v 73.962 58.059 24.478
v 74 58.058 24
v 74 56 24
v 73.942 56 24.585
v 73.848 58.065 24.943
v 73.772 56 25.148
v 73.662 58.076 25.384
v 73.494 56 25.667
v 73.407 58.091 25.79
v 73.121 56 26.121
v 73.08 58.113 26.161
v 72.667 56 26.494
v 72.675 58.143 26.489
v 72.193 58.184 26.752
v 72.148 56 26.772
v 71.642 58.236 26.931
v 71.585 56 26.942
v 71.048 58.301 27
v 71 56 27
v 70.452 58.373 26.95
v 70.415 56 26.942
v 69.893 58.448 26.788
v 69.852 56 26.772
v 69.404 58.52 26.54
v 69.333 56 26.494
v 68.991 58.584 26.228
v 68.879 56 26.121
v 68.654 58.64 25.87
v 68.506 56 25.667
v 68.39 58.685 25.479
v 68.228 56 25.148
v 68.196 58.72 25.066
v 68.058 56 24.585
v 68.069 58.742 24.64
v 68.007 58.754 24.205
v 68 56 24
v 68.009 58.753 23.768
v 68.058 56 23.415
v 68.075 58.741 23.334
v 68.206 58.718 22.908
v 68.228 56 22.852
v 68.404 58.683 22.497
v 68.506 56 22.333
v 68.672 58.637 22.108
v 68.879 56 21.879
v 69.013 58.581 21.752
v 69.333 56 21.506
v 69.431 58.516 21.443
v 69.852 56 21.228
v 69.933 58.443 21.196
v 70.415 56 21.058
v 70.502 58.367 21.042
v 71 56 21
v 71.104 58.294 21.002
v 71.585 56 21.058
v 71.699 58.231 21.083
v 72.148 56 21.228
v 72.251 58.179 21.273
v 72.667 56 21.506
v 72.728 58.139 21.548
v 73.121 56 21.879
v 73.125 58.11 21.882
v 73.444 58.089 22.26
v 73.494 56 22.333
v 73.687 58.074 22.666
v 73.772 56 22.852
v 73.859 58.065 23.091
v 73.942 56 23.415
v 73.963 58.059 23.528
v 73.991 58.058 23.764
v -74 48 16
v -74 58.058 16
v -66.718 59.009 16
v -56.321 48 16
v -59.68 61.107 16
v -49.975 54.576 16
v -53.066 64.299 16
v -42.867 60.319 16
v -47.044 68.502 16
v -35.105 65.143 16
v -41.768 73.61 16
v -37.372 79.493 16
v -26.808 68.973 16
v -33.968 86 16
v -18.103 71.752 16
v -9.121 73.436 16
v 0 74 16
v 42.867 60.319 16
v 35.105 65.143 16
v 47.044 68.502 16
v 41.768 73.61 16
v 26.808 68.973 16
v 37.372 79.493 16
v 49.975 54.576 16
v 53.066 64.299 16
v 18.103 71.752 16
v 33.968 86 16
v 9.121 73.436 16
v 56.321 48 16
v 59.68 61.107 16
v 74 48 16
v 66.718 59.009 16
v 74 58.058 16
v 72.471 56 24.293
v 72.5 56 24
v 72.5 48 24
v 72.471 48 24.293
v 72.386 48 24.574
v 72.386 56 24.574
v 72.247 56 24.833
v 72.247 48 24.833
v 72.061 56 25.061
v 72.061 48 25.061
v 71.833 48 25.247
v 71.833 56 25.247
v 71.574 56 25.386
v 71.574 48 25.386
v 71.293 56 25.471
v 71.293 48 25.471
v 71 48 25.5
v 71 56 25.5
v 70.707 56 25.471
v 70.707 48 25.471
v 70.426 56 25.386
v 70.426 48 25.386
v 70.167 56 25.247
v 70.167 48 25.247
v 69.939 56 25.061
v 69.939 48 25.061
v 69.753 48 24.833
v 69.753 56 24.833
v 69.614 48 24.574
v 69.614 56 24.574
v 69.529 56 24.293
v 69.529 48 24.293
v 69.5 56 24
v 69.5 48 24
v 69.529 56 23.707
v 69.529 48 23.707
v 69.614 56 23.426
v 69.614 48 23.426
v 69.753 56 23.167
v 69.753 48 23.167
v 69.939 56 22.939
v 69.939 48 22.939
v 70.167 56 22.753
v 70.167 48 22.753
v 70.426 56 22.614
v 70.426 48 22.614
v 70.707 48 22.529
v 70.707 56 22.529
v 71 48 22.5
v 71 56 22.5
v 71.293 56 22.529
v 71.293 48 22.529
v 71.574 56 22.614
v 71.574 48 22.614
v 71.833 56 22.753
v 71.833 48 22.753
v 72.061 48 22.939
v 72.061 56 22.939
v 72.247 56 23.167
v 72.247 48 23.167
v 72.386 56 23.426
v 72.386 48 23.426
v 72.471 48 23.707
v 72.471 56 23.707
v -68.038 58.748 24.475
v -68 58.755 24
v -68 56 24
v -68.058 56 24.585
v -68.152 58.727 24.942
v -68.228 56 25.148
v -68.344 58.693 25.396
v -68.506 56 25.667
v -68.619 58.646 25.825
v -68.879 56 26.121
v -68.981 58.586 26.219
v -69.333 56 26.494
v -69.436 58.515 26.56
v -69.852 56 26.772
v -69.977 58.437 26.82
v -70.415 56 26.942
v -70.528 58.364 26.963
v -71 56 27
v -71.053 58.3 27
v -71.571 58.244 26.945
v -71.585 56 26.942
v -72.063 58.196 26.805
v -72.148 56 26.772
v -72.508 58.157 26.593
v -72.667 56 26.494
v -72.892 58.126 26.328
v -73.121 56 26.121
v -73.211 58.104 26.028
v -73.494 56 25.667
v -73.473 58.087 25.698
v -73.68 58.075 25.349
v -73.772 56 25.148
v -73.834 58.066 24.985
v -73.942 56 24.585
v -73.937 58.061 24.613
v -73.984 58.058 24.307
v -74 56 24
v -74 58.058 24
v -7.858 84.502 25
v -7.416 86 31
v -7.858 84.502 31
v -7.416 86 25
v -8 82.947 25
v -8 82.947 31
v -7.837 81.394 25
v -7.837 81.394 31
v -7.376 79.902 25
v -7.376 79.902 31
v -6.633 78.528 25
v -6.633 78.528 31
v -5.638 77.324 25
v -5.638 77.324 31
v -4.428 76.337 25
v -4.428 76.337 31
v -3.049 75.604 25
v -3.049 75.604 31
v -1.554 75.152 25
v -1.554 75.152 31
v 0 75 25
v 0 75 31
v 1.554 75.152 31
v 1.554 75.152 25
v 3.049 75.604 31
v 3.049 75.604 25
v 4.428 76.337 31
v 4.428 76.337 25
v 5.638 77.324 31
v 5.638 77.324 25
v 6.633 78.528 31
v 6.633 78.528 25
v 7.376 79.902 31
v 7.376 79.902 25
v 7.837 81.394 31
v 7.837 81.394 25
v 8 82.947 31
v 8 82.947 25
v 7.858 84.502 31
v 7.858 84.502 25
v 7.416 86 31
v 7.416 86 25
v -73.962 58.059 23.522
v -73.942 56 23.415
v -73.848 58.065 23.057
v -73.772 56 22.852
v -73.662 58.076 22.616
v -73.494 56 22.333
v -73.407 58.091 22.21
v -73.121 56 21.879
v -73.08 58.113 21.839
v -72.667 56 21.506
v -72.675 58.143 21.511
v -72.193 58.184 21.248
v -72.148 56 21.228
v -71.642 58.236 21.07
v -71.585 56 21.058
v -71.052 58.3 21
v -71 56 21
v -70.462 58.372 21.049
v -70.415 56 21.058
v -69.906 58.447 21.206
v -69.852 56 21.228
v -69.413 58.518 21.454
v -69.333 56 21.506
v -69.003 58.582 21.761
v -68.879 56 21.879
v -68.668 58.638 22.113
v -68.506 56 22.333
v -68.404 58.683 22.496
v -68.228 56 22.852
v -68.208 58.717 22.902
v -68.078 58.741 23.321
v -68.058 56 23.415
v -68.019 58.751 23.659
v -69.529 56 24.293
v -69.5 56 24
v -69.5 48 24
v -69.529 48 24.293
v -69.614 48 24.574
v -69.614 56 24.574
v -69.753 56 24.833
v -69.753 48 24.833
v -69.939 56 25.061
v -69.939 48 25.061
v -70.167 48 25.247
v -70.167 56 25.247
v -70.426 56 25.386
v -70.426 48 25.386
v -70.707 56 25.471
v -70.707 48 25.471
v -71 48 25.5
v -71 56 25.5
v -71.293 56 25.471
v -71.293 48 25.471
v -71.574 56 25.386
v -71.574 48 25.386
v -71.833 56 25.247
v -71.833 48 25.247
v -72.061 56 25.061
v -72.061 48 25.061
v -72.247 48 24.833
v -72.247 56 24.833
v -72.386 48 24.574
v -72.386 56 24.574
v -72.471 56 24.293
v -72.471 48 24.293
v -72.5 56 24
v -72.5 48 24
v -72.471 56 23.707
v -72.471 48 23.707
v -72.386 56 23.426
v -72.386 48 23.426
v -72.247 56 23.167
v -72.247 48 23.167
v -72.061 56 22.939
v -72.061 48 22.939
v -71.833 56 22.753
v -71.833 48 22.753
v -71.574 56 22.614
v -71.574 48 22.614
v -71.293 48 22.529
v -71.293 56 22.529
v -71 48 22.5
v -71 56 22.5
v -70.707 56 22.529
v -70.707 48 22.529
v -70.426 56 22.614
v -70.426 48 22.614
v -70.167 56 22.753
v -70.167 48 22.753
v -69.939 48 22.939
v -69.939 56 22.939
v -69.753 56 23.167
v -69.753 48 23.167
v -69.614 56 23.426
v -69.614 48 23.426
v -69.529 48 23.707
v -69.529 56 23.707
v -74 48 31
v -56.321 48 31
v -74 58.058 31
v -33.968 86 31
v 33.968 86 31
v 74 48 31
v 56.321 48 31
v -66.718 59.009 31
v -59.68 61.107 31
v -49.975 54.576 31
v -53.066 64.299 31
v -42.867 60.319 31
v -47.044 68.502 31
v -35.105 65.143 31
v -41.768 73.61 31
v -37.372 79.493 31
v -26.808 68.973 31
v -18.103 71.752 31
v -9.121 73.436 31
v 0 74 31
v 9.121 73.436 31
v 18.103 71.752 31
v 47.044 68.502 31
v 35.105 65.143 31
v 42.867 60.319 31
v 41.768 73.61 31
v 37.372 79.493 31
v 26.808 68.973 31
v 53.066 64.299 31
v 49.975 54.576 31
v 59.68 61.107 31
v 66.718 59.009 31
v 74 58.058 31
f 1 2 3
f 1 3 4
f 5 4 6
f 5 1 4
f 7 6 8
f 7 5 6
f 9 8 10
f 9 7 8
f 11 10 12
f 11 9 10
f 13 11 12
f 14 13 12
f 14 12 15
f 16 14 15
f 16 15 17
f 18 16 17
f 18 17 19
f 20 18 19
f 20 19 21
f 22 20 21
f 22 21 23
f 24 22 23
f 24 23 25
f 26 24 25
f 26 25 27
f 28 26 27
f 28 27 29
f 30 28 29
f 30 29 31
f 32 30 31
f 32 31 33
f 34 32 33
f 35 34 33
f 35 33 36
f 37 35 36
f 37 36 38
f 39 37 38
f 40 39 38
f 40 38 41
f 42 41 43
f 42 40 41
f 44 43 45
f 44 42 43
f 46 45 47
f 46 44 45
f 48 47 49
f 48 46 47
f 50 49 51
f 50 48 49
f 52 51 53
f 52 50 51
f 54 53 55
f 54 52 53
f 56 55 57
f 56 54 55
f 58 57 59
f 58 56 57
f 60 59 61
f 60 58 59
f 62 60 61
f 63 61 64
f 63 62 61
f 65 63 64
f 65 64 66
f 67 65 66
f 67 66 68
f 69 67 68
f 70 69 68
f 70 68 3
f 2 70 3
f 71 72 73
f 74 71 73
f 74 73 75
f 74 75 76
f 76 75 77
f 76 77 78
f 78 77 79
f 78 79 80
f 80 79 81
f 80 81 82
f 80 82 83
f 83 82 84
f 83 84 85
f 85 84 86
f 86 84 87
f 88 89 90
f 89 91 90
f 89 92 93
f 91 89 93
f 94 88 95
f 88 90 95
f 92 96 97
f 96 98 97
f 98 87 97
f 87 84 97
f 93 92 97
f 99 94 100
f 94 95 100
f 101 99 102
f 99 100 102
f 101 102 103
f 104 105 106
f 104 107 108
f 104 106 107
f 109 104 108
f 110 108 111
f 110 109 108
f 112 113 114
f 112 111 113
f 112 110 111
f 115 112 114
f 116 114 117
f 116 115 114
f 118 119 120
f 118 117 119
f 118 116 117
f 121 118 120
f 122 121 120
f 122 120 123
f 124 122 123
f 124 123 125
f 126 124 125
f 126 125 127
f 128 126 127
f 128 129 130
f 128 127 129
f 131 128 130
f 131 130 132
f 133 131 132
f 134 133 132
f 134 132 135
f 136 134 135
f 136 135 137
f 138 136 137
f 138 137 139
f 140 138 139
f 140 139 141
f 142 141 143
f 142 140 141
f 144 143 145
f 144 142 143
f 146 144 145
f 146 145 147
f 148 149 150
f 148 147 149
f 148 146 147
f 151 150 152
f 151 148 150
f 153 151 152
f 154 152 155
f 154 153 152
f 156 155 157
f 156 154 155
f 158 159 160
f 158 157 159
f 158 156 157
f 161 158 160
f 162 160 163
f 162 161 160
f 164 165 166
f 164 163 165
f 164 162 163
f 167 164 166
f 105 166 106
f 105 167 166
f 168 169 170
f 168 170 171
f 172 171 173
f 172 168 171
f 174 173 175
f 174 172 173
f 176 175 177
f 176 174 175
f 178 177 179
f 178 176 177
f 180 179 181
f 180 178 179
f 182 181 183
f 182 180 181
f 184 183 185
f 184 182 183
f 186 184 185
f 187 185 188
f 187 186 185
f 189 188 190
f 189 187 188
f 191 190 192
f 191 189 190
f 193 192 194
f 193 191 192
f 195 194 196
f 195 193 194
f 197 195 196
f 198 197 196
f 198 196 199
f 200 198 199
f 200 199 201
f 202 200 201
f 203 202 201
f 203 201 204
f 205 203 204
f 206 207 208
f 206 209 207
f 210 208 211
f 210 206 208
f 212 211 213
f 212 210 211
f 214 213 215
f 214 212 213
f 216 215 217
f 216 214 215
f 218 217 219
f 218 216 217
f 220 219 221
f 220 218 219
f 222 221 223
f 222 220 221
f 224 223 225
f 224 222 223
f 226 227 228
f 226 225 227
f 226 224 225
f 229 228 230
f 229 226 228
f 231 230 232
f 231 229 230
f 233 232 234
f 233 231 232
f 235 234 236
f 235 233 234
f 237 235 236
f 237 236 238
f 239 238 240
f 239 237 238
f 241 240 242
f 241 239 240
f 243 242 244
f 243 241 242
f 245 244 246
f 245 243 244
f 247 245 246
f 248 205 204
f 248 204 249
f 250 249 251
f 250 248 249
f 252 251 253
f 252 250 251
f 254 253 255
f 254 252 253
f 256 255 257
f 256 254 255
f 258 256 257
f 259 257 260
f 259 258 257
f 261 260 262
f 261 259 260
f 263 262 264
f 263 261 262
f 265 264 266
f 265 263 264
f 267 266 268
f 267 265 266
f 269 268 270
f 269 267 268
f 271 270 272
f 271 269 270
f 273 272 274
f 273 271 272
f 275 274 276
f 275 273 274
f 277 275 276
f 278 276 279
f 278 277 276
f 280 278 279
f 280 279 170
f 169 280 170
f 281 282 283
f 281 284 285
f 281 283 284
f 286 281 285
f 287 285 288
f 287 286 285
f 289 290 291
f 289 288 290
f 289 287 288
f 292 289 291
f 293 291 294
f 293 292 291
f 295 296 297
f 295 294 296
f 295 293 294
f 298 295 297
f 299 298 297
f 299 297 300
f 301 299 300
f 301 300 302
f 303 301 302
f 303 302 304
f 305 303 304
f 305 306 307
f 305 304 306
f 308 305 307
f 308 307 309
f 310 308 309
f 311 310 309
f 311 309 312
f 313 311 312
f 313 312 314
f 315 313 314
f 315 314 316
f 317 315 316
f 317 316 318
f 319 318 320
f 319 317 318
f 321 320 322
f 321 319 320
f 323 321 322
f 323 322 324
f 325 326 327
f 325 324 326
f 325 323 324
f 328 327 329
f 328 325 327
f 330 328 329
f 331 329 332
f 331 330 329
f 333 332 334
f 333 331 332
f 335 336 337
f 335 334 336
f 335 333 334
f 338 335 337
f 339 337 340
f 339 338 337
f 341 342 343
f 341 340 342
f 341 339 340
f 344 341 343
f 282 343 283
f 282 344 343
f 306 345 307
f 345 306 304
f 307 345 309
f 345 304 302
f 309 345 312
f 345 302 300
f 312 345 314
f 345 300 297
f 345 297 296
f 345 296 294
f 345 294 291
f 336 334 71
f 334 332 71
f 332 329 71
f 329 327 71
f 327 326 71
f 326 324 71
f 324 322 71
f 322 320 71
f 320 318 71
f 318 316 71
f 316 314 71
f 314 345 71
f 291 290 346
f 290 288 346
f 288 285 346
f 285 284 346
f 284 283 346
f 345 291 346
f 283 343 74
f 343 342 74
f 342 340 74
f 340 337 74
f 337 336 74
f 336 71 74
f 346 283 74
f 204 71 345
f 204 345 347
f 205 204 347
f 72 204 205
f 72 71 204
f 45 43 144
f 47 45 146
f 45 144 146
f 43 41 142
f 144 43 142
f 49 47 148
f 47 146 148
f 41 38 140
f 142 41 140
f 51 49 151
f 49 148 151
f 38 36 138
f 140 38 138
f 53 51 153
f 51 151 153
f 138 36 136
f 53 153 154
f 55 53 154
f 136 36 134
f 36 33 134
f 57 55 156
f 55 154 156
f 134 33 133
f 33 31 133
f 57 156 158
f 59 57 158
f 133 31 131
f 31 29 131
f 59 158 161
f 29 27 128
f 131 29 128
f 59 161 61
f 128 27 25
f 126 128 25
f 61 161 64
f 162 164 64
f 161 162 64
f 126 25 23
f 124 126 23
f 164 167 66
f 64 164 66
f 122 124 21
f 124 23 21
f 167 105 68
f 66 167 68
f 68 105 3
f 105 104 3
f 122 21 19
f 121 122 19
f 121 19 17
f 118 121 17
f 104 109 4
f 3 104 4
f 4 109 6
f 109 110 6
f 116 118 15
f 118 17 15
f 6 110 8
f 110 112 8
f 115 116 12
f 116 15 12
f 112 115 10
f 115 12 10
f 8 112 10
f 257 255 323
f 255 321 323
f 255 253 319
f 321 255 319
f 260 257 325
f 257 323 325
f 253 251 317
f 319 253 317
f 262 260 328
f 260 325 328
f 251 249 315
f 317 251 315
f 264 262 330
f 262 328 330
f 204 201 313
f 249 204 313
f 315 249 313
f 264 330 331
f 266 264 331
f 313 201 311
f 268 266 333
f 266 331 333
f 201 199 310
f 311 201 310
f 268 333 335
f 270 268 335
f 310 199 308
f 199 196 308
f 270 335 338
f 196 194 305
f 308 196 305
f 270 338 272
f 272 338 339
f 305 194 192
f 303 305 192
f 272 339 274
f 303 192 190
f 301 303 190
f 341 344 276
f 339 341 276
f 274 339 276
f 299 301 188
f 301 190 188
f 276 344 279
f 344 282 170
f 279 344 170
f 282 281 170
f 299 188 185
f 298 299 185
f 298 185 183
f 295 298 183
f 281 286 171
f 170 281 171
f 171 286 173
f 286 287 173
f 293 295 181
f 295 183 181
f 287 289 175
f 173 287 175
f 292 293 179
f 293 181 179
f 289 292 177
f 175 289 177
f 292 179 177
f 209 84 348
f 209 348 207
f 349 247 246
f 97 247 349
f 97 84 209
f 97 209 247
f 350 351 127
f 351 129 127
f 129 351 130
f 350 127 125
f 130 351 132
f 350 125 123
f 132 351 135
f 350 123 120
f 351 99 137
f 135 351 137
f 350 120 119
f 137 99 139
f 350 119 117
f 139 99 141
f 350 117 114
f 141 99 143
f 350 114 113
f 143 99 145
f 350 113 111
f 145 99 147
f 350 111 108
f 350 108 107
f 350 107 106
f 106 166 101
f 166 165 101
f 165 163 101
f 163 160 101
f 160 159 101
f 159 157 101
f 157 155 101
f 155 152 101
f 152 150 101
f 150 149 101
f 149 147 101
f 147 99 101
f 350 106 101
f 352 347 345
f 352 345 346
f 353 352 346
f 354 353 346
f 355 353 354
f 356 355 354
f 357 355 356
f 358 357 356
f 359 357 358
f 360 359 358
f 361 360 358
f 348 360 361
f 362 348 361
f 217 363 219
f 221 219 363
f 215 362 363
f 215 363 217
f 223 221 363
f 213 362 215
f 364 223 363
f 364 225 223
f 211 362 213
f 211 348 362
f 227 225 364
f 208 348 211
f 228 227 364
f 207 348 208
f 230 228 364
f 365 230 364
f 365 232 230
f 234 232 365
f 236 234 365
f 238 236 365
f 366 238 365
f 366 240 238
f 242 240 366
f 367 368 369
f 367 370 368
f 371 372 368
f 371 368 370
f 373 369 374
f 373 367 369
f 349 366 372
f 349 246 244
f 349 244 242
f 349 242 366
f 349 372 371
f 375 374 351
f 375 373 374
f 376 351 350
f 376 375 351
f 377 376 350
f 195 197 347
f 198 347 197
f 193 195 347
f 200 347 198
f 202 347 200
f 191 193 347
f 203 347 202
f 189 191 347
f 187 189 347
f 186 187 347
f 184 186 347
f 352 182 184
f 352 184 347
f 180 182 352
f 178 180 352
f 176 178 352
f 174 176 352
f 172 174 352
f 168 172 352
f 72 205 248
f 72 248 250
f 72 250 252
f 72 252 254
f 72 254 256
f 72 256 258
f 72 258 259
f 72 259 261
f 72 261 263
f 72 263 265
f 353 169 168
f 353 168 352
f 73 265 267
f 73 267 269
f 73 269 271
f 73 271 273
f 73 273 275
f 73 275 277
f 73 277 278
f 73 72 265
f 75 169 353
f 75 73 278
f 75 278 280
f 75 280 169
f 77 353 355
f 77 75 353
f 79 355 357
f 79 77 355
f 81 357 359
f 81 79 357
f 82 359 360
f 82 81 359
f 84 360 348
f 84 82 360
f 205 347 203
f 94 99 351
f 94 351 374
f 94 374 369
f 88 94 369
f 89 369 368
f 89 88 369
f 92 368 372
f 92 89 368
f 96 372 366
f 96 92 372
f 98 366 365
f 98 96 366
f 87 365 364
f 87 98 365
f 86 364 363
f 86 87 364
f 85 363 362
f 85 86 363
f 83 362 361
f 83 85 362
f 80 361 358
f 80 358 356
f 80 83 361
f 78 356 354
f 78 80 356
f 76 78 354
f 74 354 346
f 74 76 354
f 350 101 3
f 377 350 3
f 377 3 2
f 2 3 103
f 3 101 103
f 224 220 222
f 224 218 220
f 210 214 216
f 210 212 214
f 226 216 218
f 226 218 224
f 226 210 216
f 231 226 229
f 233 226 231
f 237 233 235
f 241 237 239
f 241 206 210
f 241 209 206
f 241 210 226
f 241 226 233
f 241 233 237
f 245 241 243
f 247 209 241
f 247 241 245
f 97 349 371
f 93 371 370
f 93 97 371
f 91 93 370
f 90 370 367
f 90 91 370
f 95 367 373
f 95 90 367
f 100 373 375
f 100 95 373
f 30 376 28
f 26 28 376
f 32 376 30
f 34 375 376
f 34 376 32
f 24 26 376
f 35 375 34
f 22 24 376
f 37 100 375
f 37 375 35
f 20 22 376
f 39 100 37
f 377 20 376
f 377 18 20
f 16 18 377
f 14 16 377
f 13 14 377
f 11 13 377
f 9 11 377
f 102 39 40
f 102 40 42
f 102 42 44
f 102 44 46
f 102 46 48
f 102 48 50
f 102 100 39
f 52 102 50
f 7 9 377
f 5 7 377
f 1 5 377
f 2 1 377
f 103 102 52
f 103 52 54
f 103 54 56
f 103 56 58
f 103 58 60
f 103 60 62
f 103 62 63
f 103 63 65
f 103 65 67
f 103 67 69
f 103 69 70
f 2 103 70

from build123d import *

# Parameters (mm, degrees)
CYLINDER684_R     = 8
CYLINDER684_DEPTH = 6
CYLINDER677_R     = 3
CYLINDER677_DEPTH = 50
CYLINDER678_R     = 3
CYLINDER678_DEPTH = 50
CYLINDER670_R     = 1.5
CYLINDER670_DEPTH = 50
CYLINDER679_R     = 1.5
CYLINDER679_DEPTH = 50
CYLINDER667_R     = 74
CYLINDER667_DEPTH = 15
CYLINDER665_R     = 46
CYLINDER665_DEPTH = 36
CYLINDER666_R     = 46
CYLINDER666_DEPTH = 36
BOX752_W          = 148
BOX752_H          = 38
BOX752_DEPTH      = 15


with BuildPart() as v_lec684:
    # Cylinder684 → Cylinder684 (new body)
    with BuildSketch(Plane(origin=(0, 83, 25), x_dir=(1, 0, 0), z_dir=(0, 0, 1))):
        Circle(CYLINDER684_R)
    extrude(amount=CYLINDER684_DEPTH)


with BuildPart() as v_lec677:
    # Cylinder677 → Cylinder677 (new body)
    with BuildSketch(Plane(origin=(-71, 106, 24), x_dir=(1, 0, 0), z_dir=(0, -1, 0))):
        Circle(CYLINDER677_R)
    extrude(amount=CYLINDER677_DEPTH)


with BuildPart() as compound398:
    # Cylinder678 → Cylinder678 (new body)
    with BuildSketch(Plane(origin=(71, 106, 24), x_dir=(1, 0, 0), z_dir=(0, -1, 0))):
        Circle(CYLINDER678_R)
    extrude(amount=CYLINDER678_DEPTH)

    # Compound398: union Válec677
    add(v_lec677.part)


with BuildPart() as v_lec670:
    # Cylinder670 → Cylinder670 (new body)
    with BuildSketch(Plane(origin=(-71, 80, 24), x_dir=(1, 0, 0), z_dir=(0, -1, 0))):
        Circle(CYLINDER670_R)
    extrude(amount=CYLINDER670_DEPTH)


with BuildPart() as compound395:
    # Cylinder679 → Cylinder679 (new body)
    with BuildSketch(Plane(origin=(71, 80, 24), x_dir=(1, 0, 0), z_dir=(0, -1, 0))):
        Circle(CYLINDER679_R)
    extrude(amount=CYLINDER679_DEPTH)

    # Compound395: union Válec670
    add(v_lec670.part)


with BuildPart() as v_lec667:
    # Cylinder667 → Cylinder667 (new body)
    with BuildSketch(Plane.XY.offset(16)):
        Circle(CYLINDER667_R)
    extrude(amount=CYLINDER667_DEPTH)


with BuildPart() as v_lec665:
    # Cylinder665 → Cylinder665 (new body)
    with BuildSketch(Plane(origin=(76.3, 104, 16), x_dir=(1, 0, 0), z_dir=(0, 0, 1))):
        Circle(CYLINDER665_R)
    extrude(amount=CYLINDER665_DEPTH)


with BuildPart() as v_lec666:
    # Cylinder666 → Cylinder666 (new body)
    with BuildSketch(Plane(origin=(-76.3, 104, 16), x_dir=(1, 0, 0), z_dir=(0, 0, 1))):
        Circle(CYLINDER666_R)
    extrude(amount=CYLINDER666_DEPTH)


with BuildPart() as cut278:
    # Box752 → Box752 (new body)
    with BuildSketch(Plane(origin=(-74, 48, 16), x_dir=(1, 0, 0), z_dir=(0, 0, 1))):
        with Locations((74, 19)):
            Rectangle(BOX752_W, BOX752_H)
    extrude(amount=BOX752_DEPTH)

    # Cut269: cut Válec666
    add(v_lec666.part, mode=Mode.SUBTRACT)

    # Cut270: cut Válec665
    add(v_lec665.part, mode=Mode.SUBTRACT)

    # Cut267: cut Válec667
    add(v_lec667.part, mode=Mode.SUBTRACT)

    # Cut272: cut Compound395
    add(compound395.part, mode=Mode.SUBTRACT)

    # Cut273: cut Compound398
    add(compound398.part, mode=Mode.SUBTRACT)

    # Cut278: cut Válec684
    add(v_lec684.part, mode=Mode.SUBTRACT)


solid = cut278.part
